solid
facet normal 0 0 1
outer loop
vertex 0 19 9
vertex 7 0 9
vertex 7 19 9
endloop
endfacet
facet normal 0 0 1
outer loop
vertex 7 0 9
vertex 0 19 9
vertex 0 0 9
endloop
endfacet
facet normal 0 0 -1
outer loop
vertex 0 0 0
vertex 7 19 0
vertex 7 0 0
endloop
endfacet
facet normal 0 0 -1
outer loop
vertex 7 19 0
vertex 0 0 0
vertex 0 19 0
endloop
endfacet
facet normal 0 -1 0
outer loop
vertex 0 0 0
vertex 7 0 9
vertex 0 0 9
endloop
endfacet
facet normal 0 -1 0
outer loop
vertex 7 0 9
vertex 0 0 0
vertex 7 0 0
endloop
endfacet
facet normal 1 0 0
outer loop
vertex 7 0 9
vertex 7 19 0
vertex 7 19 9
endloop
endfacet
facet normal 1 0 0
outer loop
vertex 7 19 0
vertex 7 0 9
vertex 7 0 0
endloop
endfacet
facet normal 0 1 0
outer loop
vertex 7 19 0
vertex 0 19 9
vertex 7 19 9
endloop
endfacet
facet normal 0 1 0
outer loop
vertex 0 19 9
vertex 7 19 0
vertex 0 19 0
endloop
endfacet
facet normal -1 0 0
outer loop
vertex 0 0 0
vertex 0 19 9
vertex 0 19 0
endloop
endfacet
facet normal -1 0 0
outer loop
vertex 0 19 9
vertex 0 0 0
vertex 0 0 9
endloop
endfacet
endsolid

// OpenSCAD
// Generated by SolidPython 1.0.1 on 2020-07-29 00:46:55


cube(size = [7, 19, 9]);
/***********************************************
*********      SolidPython code:      **********
************************************************
 
# import packages: SolidPython
from solid import *
from solid.utils import *
from itertools import chain, combinations, permutations


class Resize:

    def __init__(self, scad_file):
        self.scad_file = scad_file
        #self.scad_file = import_scad(scad_file)
        # cone/cylinder param:
        self.r1 = 0
        self.r2 = 0
        self.h = 0
        # rectangular prism param:
        self.w = 0
        self.l = 0
        # ellipse param:
        self.r = 0

    # import OpenScad code (file name corresponds to shape)


    # classify shape + parameters
    def assign(self, param1, param2, param3):
        if self.scad_file == 'cone.scad':
            self.r1 = param1
            self.r2 = param2
            self.h = param3
        elif self.scad_file == 'cylinder.scad':
            self.r1 = param1
            self.r2 = param2
            self.h = param3
        elif self.scad_file == 'rectangularPrism.scad':
            self.h = param1
            self.l = param2
            self.w = param3
        else:
            self.r = param1
            self.h = param2

    # resize parameters
    def iterate(self):
        x = range(3, 20, 2)
        i = 1
        if self.scad_file == 'cone.scad':
            tempList = list(permutations(x, 2))
            for temp in tempList:
                param1 = temp[0]
                param2 = temp[1]
                filepath = 'produced_scad_files/' + 'cone' + str(param1) + '_' + str(param2) + '_' + '.scad'
                scad_render_to_file(cylinder(h=param1, r1=param2, r2=0), filepath)

        elif self.scad_file == 'cylinder.scad':
            tempList = list(permutations(x, 3))
            for temp in tempList:
                param1 = temp[0]
                param2 = temp[1]
                filepath = 'produced_scad_files/' + 'cylinder' + str(param1) + '_' + str(param2) + '_' + '.scad'
                scad_render_to_file(cylinder(h=param1, r1=param2, r2=param2), filepath)

        elif self.scad_file == 'rectangularPrism.scad':
            tempList = list(permutations(x, 3))
            for temp in tempList:
                param1 = temp[0]
                param2 = temp[1]
                param3 = temp[2]
                filepath = 'produced_scad_files/' + 'rectangularPrism' + str(param1) + '_' + str(param2) + '_' + str(
                    param3) + '.scad'
                scad_render_to_file(cube(size=(param1, param2, param3)), filepath)

        elif self.scad_file == 'ellipse.scad':
            tempList = list(permutations(x, 4))
            for temp in tempList:
                param1 = temp[0]
                param2 = temp[1]
                param3 = temp[2]
                param4 = temp[3]
                filepath = 'produced_scad_files/' + 'ellipse' + str(param1) + '_' + str(param2) + '_' + str(param3) + '_' + str(param4) + '.scad'
                scad_render_to_file(scale([param1, param2, param3])(sphere(r=param4)), filepath)

    def render_to_scadfile(self):
        scad_render_to_file(scad, 'example.scad') 
 
************************************************/
